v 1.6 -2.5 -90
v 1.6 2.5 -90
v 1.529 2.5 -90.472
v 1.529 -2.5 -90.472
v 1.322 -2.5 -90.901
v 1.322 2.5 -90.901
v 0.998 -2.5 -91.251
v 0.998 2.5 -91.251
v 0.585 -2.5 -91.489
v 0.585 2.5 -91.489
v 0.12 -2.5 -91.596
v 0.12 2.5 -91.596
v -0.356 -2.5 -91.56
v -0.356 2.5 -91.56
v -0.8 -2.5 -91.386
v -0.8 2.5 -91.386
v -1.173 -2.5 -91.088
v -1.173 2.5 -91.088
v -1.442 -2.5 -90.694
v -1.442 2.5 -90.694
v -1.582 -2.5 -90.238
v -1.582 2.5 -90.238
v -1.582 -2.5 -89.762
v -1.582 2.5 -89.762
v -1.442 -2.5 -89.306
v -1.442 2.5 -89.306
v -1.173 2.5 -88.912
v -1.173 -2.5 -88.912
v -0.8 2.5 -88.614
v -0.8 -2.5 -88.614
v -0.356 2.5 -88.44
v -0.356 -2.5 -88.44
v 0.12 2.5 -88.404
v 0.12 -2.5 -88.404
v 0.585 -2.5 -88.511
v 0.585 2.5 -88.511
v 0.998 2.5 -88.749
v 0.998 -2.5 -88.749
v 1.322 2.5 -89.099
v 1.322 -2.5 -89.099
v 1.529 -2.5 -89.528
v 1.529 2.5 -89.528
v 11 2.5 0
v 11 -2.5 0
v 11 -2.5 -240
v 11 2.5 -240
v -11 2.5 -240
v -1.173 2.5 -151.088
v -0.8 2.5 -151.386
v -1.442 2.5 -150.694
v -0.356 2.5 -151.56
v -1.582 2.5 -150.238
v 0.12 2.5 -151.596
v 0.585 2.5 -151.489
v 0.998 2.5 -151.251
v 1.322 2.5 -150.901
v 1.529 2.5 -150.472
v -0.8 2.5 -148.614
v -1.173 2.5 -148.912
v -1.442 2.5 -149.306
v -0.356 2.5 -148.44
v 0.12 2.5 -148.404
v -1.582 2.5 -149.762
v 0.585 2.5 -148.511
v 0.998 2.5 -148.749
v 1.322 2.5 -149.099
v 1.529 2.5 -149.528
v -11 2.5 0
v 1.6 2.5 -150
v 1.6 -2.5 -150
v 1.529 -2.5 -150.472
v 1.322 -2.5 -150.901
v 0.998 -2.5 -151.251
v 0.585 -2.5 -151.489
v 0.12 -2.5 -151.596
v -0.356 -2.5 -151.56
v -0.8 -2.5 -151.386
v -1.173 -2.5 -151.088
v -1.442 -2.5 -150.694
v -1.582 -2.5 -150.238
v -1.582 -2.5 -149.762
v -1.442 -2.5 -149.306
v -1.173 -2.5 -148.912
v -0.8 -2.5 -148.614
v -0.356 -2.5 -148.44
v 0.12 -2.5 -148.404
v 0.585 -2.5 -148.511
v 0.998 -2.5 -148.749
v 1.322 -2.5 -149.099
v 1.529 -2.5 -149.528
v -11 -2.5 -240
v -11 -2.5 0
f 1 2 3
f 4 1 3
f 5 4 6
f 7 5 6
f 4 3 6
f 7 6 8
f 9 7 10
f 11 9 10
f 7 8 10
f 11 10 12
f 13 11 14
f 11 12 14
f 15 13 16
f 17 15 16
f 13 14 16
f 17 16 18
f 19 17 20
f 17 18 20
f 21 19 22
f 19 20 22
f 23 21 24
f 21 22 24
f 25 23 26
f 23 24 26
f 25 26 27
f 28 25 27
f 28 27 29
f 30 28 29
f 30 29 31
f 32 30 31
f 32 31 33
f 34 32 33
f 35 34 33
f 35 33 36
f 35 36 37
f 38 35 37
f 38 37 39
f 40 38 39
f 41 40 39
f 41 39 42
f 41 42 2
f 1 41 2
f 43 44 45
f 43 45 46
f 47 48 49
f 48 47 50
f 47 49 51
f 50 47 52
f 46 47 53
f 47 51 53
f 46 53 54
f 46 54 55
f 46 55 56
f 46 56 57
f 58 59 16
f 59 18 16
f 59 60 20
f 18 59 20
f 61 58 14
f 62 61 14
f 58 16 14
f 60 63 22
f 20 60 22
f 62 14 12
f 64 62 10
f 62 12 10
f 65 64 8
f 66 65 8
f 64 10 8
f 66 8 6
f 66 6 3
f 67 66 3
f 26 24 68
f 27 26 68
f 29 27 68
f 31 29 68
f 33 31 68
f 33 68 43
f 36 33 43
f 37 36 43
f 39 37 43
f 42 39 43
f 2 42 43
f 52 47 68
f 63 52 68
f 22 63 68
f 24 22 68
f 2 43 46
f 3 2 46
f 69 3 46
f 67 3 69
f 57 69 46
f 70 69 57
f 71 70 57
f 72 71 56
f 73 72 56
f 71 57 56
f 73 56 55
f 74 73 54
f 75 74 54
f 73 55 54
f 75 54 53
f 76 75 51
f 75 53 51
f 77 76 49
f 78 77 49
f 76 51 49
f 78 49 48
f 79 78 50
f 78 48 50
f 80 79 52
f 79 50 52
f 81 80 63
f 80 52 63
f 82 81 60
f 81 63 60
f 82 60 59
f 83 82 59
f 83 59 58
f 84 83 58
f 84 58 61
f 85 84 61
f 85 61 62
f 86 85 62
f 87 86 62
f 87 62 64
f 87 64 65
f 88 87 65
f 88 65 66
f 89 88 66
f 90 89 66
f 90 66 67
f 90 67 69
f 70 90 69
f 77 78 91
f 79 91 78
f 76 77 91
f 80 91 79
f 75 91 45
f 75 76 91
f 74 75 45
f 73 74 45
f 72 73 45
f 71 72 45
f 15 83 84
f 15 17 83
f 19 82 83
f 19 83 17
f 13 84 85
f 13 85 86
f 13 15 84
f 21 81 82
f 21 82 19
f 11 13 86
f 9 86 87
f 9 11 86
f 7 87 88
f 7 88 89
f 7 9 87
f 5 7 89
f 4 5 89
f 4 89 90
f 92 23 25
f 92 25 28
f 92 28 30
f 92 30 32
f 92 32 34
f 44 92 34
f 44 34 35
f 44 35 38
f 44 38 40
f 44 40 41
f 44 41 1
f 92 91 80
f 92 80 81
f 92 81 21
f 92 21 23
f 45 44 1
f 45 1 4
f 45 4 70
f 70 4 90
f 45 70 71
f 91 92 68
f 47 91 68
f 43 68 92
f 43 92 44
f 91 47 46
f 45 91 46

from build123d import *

# Parameters (mm, degrees)
SKETCH1_W           = 22
SKETCH1_H           = 5
BOSS_EXTRUDE1_DEPTH = 240
SKETCH2_R           = 1.6
CUT_EXTRUDE1_DEPTH  = 6


with BuildPart() as part:
    # Sketch1 → Boss-Extrude1 (new body)
    with BuildSketch(Plane.XY):
        Rectangle(SKETCH1_W, SKETCH1_H)
    extrude(amount=-BOSS_EXTRUDE1_DEPTH)

    # Sketch2 → Cut-Extrude1 (cut, through all)
    with BuildSketch(Plane(origin=(0, 2.5, 0), x_dir=(1, 0, 0), z_dir=(0, 1, 0))):
        with Locations((0, 150)):
            Circle(SKETCH2_R)
        with Locations((0, 90)):
            Circle(SKETCH2_R)
    extrude(amount=-CUT_EXTRUDE1_DEPTH, mode=Mode.SUBTRACT)


solid = part.part
